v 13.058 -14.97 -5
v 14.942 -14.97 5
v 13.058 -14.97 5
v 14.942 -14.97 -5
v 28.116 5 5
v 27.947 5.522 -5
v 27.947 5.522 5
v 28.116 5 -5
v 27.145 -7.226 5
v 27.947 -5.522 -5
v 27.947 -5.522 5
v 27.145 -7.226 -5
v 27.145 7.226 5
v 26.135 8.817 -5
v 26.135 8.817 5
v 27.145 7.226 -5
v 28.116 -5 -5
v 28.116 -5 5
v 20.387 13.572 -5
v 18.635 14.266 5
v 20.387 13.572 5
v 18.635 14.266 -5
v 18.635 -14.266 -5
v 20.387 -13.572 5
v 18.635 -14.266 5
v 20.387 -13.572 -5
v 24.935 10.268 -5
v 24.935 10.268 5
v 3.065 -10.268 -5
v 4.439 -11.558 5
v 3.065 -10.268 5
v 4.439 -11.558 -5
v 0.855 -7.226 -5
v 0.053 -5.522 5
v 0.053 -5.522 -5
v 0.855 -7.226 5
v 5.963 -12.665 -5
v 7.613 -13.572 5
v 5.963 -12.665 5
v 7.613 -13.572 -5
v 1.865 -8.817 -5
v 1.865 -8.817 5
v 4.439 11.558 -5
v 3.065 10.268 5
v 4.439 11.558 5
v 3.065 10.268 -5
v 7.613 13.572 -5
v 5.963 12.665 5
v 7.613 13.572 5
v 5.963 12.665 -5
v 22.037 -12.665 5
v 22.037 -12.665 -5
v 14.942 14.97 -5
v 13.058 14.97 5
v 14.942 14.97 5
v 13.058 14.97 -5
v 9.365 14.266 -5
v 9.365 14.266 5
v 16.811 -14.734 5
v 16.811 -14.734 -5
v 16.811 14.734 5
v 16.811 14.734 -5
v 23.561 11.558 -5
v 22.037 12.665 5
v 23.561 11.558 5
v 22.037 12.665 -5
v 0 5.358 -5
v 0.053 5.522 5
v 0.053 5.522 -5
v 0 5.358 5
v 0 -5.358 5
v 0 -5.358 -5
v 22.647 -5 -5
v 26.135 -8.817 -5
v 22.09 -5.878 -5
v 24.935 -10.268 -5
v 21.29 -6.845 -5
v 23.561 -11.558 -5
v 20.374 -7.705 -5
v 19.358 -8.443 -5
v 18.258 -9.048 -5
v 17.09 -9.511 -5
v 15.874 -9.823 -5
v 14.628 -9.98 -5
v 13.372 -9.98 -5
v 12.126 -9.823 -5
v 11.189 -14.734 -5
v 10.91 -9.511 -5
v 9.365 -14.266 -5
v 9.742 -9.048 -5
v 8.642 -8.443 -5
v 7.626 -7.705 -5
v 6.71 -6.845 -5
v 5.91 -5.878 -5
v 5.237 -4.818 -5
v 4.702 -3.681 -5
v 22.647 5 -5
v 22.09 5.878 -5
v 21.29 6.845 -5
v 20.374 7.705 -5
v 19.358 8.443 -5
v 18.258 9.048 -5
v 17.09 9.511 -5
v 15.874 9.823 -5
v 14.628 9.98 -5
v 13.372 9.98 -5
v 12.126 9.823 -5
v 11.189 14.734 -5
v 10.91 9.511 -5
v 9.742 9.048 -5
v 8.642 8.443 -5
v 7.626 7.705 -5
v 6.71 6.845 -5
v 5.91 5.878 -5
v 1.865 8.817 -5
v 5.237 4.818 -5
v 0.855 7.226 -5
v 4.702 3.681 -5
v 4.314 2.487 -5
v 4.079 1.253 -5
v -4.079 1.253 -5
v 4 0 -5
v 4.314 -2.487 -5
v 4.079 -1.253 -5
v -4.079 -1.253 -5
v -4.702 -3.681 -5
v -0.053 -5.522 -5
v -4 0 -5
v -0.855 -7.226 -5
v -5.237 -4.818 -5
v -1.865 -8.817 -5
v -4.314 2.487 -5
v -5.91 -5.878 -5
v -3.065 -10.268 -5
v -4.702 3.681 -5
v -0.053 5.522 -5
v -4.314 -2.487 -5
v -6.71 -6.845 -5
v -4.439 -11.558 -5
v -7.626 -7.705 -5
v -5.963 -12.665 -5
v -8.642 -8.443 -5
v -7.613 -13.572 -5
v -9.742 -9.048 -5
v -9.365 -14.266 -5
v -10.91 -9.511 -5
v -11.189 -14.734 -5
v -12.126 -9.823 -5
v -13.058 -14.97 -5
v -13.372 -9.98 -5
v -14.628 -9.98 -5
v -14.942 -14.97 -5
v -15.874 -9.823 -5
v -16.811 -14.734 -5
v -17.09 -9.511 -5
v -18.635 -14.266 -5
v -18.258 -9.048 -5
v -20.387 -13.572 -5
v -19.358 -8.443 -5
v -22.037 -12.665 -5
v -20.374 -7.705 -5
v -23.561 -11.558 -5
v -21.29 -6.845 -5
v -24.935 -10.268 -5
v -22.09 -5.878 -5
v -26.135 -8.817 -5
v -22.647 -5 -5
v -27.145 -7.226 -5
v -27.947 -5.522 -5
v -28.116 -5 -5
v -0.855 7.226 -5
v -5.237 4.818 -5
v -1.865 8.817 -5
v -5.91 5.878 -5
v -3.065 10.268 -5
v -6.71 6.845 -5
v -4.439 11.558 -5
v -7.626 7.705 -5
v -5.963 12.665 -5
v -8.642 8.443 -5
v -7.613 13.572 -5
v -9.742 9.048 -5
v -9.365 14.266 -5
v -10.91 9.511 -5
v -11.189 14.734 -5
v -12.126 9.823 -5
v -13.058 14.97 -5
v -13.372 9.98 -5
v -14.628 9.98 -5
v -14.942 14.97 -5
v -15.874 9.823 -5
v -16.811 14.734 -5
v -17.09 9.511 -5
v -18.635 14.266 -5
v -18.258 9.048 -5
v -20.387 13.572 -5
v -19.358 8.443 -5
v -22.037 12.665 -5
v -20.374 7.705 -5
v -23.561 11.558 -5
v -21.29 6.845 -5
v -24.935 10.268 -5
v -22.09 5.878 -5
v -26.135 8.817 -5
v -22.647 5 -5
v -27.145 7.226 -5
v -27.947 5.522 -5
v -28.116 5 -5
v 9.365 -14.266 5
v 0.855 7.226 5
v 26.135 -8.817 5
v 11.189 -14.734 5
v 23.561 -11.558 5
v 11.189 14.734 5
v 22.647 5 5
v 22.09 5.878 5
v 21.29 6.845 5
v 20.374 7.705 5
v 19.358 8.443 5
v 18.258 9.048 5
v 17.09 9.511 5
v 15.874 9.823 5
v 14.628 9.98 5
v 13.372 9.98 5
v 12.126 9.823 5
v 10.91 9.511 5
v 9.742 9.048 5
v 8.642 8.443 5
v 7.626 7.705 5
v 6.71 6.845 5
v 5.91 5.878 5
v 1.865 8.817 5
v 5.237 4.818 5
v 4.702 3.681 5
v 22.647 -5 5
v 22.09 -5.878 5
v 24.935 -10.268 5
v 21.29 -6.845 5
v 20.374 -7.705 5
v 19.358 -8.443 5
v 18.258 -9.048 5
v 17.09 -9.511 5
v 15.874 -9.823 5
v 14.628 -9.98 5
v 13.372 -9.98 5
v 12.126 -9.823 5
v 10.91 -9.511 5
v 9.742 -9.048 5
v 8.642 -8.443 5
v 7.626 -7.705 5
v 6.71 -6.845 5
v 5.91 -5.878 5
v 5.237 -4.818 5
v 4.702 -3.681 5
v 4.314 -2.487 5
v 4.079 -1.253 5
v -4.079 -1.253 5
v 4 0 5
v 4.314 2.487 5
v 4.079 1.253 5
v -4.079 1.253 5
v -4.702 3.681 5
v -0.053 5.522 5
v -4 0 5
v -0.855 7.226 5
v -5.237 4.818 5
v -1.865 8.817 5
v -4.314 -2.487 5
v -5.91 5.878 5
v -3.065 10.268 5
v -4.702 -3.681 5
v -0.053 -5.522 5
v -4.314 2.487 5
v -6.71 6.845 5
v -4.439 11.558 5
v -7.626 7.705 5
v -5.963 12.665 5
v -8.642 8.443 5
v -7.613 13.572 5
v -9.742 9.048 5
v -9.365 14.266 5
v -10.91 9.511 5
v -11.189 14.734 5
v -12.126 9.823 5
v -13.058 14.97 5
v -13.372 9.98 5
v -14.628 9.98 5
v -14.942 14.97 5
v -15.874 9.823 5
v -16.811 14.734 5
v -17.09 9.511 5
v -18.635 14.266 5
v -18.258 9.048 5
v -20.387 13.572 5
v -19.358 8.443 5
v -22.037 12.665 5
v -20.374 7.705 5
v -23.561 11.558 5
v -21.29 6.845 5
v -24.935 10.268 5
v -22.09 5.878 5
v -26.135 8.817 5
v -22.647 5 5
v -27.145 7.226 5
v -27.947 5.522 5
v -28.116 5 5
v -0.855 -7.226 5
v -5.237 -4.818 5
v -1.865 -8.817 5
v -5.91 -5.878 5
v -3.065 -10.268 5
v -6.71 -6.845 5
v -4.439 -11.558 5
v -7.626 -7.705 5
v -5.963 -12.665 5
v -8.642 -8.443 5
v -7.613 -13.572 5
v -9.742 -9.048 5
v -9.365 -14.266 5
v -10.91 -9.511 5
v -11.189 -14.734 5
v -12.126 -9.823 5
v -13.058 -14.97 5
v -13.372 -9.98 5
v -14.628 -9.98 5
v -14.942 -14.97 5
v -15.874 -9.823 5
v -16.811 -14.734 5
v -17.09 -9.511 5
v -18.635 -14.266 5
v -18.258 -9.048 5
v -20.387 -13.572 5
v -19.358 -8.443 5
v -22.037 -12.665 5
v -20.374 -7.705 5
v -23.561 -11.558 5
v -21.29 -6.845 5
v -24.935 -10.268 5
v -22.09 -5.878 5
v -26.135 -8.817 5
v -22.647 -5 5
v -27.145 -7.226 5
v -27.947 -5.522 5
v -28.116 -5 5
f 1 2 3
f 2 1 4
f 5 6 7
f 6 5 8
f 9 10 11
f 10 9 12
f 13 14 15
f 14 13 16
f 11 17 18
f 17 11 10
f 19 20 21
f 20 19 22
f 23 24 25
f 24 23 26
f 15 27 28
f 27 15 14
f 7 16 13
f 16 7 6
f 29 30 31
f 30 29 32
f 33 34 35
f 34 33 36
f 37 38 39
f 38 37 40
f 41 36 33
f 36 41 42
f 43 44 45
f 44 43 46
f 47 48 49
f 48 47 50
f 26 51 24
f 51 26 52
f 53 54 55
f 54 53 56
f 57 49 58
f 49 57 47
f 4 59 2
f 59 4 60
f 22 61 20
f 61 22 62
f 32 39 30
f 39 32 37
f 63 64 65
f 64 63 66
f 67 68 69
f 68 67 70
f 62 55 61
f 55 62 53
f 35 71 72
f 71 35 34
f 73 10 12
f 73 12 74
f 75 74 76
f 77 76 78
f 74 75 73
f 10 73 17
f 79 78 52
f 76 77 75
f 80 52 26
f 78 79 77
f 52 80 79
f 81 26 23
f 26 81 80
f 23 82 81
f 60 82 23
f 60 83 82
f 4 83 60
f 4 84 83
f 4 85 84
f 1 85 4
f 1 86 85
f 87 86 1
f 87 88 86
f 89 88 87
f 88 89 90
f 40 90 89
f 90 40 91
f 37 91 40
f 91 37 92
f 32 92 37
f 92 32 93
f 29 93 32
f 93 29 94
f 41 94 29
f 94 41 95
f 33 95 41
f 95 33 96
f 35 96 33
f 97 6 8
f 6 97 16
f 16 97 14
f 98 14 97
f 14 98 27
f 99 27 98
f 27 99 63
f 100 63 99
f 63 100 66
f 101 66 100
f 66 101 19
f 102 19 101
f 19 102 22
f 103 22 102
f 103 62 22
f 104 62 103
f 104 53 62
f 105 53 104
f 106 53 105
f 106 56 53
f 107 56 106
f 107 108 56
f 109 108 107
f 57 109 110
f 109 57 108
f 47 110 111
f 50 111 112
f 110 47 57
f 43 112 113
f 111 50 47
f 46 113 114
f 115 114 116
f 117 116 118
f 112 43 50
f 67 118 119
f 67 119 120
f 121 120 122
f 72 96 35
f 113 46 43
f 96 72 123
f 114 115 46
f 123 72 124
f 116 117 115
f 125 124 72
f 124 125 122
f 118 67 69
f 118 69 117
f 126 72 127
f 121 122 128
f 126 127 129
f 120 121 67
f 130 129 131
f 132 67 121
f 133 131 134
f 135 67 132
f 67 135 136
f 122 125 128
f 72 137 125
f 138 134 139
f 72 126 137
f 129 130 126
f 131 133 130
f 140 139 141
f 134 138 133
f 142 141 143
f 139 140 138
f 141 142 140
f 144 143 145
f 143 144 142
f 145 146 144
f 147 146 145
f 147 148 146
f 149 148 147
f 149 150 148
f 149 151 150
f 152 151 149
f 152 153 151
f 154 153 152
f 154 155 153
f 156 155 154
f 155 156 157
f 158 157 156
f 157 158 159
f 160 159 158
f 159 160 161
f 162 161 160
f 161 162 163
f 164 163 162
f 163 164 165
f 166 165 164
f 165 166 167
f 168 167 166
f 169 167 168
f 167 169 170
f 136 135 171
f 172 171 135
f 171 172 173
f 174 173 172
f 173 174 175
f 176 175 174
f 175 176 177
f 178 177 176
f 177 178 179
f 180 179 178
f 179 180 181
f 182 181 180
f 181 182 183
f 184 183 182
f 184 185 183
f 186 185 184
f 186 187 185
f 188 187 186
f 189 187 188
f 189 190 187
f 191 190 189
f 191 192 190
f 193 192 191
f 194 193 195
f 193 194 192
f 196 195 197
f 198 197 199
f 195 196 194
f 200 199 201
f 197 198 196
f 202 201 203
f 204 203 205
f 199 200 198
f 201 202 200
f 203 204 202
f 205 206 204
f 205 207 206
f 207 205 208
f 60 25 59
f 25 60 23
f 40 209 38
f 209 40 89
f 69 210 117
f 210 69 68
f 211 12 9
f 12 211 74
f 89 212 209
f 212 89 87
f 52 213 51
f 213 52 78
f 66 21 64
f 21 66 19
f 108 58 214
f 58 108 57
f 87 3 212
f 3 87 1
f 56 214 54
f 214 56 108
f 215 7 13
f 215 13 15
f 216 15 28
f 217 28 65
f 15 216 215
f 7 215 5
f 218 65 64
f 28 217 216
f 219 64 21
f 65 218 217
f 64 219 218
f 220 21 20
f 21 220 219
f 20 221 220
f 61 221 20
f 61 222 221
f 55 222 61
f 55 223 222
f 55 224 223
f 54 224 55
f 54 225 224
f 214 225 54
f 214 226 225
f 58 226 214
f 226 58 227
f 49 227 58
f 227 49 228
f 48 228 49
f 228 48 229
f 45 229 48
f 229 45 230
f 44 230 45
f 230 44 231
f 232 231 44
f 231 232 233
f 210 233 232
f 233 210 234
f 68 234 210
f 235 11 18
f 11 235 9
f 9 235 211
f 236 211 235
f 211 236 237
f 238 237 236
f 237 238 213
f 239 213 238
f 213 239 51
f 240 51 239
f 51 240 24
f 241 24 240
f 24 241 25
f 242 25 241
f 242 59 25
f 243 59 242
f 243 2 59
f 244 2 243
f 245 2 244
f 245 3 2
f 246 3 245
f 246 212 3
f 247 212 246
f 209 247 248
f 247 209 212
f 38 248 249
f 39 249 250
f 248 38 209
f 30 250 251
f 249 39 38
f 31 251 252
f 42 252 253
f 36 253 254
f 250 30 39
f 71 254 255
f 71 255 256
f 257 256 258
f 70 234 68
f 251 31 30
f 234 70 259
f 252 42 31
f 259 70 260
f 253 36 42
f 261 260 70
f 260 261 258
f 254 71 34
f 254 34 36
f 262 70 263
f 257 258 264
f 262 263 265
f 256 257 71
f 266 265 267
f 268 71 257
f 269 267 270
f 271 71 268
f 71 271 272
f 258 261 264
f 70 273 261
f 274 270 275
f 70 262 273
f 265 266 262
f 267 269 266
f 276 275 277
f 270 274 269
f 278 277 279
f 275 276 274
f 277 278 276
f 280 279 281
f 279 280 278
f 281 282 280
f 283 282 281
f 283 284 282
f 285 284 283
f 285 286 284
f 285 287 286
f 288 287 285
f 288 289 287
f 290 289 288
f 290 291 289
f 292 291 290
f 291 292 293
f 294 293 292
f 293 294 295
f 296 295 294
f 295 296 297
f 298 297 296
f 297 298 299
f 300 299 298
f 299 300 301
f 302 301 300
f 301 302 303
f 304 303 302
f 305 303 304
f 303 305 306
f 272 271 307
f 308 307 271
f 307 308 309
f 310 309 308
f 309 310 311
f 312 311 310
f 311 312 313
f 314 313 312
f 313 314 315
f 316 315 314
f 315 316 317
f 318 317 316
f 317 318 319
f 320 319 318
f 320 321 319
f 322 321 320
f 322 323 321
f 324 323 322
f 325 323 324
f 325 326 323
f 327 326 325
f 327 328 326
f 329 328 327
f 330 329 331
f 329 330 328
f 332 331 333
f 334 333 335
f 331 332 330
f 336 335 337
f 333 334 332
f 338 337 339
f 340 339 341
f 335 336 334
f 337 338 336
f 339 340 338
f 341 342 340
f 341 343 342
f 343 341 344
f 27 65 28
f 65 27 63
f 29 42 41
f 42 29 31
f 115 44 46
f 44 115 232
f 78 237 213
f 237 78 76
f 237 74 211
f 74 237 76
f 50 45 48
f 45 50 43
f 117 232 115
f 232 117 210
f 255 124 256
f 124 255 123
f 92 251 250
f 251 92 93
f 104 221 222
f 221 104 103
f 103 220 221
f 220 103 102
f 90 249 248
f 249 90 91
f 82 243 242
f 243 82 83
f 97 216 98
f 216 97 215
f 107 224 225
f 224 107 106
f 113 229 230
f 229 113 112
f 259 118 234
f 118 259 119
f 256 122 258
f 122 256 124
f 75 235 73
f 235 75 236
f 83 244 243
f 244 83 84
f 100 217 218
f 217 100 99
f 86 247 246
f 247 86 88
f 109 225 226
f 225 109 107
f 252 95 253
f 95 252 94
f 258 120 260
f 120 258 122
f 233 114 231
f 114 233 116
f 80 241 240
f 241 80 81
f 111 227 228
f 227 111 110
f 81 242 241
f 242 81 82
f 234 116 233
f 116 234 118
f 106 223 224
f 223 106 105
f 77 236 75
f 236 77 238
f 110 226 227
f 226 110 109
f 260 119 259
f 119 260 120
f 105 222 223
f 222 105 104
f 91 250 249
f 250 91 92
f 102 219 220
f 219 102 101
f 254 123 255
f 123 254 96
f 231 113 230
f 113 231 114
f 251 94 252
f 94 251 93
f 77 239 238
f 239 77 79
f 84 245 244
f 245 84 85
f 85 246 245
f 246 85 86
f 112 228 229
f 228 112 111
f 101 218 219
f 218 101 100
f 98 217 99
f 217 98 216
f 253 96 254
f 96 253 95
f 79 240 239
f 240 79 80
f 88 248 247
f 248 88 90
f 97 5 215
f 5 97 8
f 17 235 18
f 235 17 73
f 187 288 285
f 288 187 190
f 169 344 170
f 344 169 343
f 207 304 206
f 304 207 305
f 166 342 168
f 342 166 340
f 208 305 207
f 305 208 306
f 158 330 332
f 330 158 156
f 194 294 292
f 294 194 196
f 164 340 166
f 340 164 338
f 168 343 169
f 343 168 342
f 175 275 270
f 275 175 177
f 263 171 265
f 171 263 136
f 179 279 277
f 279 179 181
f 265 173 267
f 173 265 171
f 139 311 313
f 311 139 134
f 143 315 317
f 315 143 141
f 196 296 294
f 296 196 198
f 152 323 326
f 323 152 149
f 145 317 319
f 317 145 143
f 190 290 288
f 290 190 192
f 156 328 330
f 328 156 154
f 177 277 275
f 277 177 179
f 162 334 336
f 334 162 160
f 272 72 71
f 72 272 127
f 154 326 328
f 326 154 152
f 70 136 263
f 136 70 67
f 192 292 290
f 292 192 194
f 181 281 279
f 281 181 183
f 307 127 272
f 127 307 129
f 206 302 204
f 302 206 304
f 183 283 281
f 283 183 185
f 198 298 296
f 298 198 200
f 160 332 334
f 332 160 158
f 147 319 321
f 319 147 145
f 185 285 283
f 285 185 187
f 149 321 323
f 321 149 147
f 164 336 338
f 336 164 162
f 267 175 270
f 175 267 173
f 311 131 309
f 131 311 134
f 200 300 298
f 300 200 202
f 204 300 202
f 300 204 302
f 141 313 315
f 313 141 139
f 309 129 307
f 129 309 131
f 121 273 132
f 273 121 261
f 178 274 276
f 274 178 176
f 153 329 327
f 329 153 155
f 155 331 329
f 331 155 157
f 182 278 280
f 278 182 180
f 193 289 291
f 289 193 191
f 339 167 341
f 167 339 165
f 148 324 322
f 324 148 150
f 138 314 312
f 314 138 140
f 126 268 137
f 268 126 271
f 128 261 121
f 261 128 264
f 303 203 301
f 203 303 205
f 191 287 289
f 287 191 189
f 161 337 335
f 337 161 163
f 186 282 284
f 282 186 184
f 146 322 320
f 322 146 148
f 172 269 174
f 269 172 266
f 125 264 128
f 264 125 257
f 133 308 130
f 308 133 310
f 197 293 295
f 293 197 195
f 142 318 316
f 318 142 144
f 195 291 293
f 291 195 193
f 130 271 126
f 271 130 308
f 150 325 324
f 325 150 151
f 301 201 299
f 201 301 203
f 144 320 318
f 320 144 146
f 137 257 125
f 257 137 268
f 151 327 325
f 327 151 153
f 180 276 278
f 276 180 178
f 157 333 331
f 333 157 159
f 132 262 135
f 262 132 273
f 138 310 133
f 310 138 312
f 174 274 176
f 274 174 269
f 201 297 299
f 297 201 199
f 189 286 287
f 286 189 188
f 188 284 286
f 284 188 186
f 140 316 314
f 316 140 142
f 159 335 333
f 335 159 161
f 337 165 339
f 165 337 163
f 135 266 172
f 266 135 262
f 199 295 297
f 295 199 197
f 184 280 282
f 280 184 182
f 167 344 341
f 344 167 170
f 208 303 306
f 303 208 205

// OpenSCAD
/* variables */

//The number of Cables: 
ring_number = 2; //[2:6]

//The size of Ring:
ring_radius = 15; //[10:20]

//The height of Arranger:
height = 10; //[5:50]

//The thickness or Rings:
thickness = 5; //[3:10]


//edit
angle = 360/(ring_number*2);


module unit() {
    

        difference () {
            
            cylinder (h = height, r = ring_radius, center = true, $fn = 50);
            cylinder (h = height, r = ring_radius-thickness, center = true, $fn = 50);
            
            translate ( [ring_radius-thickness/2, 0, 0] ) {
                cube([(ring_radius+thickness)/2, (ring_radius+thickness)/2, height], center = true);
            }
        }
    }


for ( i = [0:ring_number-1] ) {
    rotate ( i*360/ring_number, [0, 0, 1] )
    translate ( [ring_radius/sin(angle)-1, 0, 0] ) 
     unit();
}
